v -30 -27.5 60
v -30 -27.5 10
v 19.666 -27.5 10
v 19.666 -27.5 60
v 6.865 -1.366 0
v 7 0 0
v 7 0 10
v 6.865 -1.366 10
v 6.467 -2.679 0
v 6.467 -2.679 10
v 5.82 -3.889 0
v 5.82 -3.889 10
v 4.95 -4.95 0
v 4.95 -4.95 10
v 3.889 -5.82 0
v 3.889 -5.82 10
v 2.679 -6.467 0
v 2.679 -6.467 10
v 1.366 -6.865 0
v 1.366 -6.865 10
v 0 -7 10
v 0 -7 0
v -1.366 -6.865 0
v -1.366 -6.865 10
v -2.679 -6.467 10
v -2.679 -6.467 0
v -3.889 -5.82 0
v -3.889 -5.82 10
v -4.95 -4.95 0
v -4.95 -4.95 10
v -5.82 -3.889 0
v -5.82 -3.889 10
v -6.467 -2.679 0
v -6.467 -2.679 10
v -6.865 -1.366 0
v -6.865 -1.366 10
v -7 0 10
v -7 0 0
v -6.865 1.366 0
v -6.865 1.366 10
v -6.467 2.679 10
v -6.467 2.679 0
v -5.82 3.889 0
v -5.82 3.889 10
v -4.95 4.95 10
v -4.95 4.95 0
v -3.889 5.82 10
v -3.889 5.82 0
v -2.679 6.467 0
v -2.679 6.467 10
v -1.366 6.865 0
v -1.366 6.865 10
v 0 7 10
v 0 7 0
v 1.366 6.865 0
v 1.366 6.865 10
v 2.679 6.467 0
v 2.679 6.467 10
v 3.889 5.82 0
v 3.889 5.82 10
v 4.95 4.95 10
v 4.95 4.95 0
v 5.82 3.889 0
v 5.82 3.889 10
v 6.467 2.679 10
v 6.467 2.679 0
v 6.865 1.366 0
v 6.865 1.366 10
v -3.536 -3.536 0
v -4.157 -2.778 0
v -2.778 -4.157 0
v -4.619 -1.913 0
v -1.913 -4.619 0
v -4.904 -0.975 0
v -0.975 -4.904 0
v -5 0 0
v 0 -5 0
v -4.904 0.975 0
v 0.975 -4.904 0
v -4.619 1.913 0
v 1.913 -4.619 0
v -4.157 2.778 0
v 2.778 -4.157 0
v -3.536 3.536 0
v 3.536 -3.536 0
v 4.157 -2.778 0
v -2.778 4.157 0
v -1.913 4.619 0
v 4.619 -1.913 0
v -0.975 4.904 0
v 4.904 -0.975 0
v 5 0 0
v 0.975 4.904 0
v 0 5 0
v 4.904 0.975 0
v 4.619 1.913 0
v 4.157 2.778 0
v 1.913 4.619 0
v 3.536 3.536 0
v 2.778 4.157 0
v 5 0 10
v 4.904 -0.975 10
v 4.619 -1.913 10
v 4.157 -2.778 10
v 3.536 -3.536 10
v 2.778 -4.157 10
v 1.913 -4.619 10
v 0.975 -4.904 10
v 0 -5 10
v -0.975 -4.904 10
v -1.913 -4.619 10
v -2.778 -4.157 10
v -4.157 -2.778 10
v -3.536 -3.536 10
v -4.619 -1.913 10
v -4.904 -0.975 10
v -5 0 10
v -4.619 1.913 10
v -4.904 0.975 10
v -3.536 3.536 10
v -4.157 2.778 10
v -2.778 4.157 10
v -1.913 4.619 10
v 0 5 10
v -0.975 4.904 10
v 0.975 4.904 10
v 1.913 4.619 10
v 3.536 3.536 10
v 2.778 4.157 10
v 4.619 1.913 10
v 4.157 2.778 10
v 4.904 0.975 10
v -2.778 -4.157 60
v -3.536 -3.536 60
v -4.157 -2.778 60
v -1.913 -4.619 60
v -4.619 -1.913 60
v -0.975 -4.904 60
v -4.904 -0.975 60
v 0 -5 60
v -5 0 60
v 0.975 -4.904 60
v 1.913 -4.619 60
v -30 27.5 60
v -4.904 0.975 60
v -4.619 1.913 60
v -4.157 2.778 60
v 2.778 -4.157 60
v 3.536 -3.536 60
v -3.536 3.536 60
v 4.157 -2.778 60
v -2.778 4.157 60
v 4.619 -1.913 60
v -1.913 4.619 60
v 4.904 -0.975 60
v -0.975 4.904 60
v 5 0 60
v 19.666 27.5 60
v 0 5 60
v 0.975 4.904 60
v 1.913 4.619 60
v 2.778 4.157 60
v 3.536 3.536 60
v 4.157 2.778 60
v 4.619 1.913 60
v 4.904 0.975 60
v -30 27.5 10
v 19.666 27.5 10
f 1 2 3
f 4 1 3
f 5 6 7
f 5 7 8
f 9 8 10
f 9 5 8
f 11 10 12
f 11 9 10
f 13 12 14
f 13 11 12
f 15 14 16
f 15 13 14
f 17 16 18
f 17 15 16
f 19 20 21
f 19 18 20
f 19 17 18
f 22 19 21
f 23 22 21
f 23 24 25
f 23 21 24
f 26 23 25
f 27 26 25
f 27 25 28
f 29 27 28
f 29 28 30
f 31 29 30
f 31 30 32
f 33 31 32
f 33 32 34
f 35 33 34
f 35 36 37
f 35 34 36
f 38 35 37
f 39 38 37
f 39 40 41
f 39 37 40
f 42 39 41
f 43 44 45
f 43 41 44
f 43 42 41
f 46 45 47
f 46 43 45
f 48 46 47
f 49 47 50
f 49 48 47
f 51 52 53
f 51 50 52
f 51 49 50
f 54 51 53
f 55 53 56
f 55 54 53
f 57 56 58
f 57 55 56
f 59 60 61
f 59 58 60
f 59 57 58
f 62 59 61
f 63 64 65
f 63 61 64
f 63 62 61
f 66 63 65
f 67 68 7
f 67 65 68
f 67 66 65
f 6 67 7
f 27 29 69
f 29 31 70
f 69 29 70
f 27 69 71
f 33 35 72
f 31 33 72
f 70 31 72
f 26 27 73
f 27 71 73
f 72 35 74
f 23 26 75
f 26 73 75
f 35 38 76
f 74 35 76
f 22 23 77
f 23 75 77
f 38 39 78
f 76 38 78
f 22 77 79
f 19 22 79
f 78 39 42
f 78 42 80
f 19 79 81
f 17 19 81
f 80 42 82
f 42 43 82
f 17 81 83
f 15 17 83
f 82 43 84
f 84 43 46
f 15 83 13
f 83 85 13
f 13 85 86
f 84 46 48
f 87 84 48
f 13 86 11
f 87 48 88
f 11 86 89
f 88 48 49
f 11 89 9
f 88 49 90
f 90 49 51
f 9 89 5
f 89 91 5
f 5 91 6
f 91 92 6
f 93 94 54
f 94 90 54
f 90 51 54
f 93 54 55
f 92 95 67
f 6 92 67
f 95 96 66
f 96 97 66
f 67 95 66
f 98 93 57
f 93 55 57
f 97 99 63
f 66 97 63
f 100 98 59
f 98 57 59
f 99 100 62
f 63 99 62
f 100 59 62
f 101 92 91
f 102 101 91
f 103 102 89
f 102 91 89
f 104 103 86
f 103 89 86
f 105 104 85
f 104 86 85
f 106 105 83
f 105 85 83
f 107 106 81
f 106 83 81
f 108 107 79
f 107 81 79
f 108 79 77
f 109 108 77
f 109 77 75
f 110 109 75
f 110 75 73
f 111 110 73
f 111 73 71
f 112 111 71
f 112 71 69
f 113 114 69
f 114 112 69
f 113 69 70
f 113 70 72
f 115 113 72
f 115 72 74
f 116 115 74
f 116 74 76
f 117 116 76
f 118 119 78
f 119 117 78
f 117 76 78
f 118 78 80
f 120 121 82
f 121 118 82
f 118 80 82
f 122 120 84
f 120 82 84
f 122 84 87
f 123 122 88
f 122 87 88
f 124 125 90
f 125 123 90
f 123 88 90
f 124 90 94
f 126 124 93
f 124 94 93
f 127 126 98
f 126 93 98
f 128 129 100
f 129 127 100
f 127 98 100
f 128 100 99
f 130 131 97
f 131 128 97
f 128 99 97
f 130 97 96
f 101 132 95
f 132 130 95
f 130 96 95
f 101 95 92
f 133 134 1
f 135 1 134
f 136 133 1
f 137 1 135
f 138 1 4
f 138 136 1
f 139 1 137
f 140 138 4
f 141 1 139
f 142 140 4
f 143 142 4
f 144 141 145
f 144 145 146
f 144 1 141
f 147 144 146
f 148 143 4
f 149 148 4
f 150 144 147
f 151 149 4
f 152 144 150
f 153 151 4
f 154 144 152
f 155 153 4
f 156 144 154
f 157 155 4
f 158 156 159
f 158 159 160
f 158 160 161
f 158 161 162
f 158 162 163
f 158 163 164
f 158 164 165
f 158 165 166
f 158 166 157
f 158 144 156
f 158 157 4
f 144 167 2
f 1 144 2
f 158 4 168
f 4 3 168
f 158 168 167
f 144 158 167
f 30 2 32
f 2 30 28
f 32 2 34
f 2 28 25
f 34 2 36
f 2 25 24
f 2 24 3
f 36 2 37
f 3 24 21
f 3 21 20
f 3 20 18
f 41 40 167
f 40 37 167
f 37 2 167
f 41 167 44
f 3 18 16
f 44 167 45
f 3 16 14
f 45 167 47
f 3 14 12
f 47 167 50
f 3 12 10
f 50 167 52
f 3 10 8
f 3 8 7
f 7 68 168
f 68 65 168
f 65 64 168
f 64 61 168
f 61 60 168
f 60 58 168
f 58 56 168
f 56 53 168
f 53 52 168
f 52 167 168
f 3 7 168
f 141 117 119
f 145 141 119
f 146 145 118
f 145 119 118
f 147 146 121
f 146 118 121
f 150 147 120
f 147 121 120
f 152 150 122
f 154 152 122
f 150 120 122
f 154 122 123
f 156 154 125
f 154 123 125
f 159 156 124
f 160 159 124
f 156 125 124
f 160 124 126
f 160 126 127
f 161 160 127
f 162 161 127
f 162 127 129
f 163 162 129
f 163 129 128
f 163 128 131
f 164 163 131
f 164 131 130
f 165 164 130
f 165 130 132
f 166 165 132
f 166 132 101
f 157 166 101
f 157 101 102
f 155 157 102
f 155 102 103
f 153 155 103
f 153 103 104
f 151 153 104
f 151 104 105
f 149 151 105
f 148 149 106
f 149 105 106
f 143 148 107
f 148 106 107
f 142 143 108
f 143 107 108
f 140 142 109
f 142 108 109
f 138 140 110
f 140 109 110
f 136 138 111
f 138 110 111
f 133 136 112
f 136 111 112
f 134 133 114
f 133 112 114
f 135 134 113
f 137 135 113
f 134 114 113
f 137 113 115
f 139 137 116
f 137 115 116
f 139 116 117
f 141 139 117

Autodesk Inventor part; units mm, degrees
ref_plane "YZ Plane" through (0, 0, 0) normal (1, 0, 0) x (0, 1, 0)
ref_plane "XZ Plane" through (0, 0, 0) normal (0, 1, 0) x (-1, 0, 0)
ref_plane "XY Plane" through (0, 0, 0) normal (0, 0, 1) x (1, 0, 0)
sketch "Sketch1" plane through (0, 0, 0) normal (0, 0, 1) x (1, 0, 0)
  circle A0 centre (0, 0) radius 5
  circle A1 centre (0, 0) radius 7
  dimension "d0" = 10
  dimension "d1" = 14
extrude "Extrusion1" add sketch "Sketch1" along normal blind 10
sketch "Sketch2" plane through (0, 0, 10) normal (0, 0, 1) x (1, 0, 0)
  line L0 (-30, -27.5) -> (19.666, -27.5)
  line L1 (19.666, -27.5) -> (19.666, 27.5)
  line L2 (19.666, 27.5) -> (-30, 27.5)
  line L3 (-30, 27.5) -> (-30, -27.5)
  point P0 (0, 0)
  point P1 (-30, 0)
  dimension "d4" = 19.666
  dimension "d5" = 55
  dimension "d6" = 30
extrude "Extrusion2" add sketch "Sketch2" along normal blind 50
sketch "Sketch3" plane through (0, 0, 10) normal (0, 0, -1) x (-1, 0, 0)
  circle A0 centre (0, 0) radius 5 projected
extrude "Extrusion3" cut sketch "Sketch3" against normal up to surface (50 mm away)
properties part number "02BombaJarron"
